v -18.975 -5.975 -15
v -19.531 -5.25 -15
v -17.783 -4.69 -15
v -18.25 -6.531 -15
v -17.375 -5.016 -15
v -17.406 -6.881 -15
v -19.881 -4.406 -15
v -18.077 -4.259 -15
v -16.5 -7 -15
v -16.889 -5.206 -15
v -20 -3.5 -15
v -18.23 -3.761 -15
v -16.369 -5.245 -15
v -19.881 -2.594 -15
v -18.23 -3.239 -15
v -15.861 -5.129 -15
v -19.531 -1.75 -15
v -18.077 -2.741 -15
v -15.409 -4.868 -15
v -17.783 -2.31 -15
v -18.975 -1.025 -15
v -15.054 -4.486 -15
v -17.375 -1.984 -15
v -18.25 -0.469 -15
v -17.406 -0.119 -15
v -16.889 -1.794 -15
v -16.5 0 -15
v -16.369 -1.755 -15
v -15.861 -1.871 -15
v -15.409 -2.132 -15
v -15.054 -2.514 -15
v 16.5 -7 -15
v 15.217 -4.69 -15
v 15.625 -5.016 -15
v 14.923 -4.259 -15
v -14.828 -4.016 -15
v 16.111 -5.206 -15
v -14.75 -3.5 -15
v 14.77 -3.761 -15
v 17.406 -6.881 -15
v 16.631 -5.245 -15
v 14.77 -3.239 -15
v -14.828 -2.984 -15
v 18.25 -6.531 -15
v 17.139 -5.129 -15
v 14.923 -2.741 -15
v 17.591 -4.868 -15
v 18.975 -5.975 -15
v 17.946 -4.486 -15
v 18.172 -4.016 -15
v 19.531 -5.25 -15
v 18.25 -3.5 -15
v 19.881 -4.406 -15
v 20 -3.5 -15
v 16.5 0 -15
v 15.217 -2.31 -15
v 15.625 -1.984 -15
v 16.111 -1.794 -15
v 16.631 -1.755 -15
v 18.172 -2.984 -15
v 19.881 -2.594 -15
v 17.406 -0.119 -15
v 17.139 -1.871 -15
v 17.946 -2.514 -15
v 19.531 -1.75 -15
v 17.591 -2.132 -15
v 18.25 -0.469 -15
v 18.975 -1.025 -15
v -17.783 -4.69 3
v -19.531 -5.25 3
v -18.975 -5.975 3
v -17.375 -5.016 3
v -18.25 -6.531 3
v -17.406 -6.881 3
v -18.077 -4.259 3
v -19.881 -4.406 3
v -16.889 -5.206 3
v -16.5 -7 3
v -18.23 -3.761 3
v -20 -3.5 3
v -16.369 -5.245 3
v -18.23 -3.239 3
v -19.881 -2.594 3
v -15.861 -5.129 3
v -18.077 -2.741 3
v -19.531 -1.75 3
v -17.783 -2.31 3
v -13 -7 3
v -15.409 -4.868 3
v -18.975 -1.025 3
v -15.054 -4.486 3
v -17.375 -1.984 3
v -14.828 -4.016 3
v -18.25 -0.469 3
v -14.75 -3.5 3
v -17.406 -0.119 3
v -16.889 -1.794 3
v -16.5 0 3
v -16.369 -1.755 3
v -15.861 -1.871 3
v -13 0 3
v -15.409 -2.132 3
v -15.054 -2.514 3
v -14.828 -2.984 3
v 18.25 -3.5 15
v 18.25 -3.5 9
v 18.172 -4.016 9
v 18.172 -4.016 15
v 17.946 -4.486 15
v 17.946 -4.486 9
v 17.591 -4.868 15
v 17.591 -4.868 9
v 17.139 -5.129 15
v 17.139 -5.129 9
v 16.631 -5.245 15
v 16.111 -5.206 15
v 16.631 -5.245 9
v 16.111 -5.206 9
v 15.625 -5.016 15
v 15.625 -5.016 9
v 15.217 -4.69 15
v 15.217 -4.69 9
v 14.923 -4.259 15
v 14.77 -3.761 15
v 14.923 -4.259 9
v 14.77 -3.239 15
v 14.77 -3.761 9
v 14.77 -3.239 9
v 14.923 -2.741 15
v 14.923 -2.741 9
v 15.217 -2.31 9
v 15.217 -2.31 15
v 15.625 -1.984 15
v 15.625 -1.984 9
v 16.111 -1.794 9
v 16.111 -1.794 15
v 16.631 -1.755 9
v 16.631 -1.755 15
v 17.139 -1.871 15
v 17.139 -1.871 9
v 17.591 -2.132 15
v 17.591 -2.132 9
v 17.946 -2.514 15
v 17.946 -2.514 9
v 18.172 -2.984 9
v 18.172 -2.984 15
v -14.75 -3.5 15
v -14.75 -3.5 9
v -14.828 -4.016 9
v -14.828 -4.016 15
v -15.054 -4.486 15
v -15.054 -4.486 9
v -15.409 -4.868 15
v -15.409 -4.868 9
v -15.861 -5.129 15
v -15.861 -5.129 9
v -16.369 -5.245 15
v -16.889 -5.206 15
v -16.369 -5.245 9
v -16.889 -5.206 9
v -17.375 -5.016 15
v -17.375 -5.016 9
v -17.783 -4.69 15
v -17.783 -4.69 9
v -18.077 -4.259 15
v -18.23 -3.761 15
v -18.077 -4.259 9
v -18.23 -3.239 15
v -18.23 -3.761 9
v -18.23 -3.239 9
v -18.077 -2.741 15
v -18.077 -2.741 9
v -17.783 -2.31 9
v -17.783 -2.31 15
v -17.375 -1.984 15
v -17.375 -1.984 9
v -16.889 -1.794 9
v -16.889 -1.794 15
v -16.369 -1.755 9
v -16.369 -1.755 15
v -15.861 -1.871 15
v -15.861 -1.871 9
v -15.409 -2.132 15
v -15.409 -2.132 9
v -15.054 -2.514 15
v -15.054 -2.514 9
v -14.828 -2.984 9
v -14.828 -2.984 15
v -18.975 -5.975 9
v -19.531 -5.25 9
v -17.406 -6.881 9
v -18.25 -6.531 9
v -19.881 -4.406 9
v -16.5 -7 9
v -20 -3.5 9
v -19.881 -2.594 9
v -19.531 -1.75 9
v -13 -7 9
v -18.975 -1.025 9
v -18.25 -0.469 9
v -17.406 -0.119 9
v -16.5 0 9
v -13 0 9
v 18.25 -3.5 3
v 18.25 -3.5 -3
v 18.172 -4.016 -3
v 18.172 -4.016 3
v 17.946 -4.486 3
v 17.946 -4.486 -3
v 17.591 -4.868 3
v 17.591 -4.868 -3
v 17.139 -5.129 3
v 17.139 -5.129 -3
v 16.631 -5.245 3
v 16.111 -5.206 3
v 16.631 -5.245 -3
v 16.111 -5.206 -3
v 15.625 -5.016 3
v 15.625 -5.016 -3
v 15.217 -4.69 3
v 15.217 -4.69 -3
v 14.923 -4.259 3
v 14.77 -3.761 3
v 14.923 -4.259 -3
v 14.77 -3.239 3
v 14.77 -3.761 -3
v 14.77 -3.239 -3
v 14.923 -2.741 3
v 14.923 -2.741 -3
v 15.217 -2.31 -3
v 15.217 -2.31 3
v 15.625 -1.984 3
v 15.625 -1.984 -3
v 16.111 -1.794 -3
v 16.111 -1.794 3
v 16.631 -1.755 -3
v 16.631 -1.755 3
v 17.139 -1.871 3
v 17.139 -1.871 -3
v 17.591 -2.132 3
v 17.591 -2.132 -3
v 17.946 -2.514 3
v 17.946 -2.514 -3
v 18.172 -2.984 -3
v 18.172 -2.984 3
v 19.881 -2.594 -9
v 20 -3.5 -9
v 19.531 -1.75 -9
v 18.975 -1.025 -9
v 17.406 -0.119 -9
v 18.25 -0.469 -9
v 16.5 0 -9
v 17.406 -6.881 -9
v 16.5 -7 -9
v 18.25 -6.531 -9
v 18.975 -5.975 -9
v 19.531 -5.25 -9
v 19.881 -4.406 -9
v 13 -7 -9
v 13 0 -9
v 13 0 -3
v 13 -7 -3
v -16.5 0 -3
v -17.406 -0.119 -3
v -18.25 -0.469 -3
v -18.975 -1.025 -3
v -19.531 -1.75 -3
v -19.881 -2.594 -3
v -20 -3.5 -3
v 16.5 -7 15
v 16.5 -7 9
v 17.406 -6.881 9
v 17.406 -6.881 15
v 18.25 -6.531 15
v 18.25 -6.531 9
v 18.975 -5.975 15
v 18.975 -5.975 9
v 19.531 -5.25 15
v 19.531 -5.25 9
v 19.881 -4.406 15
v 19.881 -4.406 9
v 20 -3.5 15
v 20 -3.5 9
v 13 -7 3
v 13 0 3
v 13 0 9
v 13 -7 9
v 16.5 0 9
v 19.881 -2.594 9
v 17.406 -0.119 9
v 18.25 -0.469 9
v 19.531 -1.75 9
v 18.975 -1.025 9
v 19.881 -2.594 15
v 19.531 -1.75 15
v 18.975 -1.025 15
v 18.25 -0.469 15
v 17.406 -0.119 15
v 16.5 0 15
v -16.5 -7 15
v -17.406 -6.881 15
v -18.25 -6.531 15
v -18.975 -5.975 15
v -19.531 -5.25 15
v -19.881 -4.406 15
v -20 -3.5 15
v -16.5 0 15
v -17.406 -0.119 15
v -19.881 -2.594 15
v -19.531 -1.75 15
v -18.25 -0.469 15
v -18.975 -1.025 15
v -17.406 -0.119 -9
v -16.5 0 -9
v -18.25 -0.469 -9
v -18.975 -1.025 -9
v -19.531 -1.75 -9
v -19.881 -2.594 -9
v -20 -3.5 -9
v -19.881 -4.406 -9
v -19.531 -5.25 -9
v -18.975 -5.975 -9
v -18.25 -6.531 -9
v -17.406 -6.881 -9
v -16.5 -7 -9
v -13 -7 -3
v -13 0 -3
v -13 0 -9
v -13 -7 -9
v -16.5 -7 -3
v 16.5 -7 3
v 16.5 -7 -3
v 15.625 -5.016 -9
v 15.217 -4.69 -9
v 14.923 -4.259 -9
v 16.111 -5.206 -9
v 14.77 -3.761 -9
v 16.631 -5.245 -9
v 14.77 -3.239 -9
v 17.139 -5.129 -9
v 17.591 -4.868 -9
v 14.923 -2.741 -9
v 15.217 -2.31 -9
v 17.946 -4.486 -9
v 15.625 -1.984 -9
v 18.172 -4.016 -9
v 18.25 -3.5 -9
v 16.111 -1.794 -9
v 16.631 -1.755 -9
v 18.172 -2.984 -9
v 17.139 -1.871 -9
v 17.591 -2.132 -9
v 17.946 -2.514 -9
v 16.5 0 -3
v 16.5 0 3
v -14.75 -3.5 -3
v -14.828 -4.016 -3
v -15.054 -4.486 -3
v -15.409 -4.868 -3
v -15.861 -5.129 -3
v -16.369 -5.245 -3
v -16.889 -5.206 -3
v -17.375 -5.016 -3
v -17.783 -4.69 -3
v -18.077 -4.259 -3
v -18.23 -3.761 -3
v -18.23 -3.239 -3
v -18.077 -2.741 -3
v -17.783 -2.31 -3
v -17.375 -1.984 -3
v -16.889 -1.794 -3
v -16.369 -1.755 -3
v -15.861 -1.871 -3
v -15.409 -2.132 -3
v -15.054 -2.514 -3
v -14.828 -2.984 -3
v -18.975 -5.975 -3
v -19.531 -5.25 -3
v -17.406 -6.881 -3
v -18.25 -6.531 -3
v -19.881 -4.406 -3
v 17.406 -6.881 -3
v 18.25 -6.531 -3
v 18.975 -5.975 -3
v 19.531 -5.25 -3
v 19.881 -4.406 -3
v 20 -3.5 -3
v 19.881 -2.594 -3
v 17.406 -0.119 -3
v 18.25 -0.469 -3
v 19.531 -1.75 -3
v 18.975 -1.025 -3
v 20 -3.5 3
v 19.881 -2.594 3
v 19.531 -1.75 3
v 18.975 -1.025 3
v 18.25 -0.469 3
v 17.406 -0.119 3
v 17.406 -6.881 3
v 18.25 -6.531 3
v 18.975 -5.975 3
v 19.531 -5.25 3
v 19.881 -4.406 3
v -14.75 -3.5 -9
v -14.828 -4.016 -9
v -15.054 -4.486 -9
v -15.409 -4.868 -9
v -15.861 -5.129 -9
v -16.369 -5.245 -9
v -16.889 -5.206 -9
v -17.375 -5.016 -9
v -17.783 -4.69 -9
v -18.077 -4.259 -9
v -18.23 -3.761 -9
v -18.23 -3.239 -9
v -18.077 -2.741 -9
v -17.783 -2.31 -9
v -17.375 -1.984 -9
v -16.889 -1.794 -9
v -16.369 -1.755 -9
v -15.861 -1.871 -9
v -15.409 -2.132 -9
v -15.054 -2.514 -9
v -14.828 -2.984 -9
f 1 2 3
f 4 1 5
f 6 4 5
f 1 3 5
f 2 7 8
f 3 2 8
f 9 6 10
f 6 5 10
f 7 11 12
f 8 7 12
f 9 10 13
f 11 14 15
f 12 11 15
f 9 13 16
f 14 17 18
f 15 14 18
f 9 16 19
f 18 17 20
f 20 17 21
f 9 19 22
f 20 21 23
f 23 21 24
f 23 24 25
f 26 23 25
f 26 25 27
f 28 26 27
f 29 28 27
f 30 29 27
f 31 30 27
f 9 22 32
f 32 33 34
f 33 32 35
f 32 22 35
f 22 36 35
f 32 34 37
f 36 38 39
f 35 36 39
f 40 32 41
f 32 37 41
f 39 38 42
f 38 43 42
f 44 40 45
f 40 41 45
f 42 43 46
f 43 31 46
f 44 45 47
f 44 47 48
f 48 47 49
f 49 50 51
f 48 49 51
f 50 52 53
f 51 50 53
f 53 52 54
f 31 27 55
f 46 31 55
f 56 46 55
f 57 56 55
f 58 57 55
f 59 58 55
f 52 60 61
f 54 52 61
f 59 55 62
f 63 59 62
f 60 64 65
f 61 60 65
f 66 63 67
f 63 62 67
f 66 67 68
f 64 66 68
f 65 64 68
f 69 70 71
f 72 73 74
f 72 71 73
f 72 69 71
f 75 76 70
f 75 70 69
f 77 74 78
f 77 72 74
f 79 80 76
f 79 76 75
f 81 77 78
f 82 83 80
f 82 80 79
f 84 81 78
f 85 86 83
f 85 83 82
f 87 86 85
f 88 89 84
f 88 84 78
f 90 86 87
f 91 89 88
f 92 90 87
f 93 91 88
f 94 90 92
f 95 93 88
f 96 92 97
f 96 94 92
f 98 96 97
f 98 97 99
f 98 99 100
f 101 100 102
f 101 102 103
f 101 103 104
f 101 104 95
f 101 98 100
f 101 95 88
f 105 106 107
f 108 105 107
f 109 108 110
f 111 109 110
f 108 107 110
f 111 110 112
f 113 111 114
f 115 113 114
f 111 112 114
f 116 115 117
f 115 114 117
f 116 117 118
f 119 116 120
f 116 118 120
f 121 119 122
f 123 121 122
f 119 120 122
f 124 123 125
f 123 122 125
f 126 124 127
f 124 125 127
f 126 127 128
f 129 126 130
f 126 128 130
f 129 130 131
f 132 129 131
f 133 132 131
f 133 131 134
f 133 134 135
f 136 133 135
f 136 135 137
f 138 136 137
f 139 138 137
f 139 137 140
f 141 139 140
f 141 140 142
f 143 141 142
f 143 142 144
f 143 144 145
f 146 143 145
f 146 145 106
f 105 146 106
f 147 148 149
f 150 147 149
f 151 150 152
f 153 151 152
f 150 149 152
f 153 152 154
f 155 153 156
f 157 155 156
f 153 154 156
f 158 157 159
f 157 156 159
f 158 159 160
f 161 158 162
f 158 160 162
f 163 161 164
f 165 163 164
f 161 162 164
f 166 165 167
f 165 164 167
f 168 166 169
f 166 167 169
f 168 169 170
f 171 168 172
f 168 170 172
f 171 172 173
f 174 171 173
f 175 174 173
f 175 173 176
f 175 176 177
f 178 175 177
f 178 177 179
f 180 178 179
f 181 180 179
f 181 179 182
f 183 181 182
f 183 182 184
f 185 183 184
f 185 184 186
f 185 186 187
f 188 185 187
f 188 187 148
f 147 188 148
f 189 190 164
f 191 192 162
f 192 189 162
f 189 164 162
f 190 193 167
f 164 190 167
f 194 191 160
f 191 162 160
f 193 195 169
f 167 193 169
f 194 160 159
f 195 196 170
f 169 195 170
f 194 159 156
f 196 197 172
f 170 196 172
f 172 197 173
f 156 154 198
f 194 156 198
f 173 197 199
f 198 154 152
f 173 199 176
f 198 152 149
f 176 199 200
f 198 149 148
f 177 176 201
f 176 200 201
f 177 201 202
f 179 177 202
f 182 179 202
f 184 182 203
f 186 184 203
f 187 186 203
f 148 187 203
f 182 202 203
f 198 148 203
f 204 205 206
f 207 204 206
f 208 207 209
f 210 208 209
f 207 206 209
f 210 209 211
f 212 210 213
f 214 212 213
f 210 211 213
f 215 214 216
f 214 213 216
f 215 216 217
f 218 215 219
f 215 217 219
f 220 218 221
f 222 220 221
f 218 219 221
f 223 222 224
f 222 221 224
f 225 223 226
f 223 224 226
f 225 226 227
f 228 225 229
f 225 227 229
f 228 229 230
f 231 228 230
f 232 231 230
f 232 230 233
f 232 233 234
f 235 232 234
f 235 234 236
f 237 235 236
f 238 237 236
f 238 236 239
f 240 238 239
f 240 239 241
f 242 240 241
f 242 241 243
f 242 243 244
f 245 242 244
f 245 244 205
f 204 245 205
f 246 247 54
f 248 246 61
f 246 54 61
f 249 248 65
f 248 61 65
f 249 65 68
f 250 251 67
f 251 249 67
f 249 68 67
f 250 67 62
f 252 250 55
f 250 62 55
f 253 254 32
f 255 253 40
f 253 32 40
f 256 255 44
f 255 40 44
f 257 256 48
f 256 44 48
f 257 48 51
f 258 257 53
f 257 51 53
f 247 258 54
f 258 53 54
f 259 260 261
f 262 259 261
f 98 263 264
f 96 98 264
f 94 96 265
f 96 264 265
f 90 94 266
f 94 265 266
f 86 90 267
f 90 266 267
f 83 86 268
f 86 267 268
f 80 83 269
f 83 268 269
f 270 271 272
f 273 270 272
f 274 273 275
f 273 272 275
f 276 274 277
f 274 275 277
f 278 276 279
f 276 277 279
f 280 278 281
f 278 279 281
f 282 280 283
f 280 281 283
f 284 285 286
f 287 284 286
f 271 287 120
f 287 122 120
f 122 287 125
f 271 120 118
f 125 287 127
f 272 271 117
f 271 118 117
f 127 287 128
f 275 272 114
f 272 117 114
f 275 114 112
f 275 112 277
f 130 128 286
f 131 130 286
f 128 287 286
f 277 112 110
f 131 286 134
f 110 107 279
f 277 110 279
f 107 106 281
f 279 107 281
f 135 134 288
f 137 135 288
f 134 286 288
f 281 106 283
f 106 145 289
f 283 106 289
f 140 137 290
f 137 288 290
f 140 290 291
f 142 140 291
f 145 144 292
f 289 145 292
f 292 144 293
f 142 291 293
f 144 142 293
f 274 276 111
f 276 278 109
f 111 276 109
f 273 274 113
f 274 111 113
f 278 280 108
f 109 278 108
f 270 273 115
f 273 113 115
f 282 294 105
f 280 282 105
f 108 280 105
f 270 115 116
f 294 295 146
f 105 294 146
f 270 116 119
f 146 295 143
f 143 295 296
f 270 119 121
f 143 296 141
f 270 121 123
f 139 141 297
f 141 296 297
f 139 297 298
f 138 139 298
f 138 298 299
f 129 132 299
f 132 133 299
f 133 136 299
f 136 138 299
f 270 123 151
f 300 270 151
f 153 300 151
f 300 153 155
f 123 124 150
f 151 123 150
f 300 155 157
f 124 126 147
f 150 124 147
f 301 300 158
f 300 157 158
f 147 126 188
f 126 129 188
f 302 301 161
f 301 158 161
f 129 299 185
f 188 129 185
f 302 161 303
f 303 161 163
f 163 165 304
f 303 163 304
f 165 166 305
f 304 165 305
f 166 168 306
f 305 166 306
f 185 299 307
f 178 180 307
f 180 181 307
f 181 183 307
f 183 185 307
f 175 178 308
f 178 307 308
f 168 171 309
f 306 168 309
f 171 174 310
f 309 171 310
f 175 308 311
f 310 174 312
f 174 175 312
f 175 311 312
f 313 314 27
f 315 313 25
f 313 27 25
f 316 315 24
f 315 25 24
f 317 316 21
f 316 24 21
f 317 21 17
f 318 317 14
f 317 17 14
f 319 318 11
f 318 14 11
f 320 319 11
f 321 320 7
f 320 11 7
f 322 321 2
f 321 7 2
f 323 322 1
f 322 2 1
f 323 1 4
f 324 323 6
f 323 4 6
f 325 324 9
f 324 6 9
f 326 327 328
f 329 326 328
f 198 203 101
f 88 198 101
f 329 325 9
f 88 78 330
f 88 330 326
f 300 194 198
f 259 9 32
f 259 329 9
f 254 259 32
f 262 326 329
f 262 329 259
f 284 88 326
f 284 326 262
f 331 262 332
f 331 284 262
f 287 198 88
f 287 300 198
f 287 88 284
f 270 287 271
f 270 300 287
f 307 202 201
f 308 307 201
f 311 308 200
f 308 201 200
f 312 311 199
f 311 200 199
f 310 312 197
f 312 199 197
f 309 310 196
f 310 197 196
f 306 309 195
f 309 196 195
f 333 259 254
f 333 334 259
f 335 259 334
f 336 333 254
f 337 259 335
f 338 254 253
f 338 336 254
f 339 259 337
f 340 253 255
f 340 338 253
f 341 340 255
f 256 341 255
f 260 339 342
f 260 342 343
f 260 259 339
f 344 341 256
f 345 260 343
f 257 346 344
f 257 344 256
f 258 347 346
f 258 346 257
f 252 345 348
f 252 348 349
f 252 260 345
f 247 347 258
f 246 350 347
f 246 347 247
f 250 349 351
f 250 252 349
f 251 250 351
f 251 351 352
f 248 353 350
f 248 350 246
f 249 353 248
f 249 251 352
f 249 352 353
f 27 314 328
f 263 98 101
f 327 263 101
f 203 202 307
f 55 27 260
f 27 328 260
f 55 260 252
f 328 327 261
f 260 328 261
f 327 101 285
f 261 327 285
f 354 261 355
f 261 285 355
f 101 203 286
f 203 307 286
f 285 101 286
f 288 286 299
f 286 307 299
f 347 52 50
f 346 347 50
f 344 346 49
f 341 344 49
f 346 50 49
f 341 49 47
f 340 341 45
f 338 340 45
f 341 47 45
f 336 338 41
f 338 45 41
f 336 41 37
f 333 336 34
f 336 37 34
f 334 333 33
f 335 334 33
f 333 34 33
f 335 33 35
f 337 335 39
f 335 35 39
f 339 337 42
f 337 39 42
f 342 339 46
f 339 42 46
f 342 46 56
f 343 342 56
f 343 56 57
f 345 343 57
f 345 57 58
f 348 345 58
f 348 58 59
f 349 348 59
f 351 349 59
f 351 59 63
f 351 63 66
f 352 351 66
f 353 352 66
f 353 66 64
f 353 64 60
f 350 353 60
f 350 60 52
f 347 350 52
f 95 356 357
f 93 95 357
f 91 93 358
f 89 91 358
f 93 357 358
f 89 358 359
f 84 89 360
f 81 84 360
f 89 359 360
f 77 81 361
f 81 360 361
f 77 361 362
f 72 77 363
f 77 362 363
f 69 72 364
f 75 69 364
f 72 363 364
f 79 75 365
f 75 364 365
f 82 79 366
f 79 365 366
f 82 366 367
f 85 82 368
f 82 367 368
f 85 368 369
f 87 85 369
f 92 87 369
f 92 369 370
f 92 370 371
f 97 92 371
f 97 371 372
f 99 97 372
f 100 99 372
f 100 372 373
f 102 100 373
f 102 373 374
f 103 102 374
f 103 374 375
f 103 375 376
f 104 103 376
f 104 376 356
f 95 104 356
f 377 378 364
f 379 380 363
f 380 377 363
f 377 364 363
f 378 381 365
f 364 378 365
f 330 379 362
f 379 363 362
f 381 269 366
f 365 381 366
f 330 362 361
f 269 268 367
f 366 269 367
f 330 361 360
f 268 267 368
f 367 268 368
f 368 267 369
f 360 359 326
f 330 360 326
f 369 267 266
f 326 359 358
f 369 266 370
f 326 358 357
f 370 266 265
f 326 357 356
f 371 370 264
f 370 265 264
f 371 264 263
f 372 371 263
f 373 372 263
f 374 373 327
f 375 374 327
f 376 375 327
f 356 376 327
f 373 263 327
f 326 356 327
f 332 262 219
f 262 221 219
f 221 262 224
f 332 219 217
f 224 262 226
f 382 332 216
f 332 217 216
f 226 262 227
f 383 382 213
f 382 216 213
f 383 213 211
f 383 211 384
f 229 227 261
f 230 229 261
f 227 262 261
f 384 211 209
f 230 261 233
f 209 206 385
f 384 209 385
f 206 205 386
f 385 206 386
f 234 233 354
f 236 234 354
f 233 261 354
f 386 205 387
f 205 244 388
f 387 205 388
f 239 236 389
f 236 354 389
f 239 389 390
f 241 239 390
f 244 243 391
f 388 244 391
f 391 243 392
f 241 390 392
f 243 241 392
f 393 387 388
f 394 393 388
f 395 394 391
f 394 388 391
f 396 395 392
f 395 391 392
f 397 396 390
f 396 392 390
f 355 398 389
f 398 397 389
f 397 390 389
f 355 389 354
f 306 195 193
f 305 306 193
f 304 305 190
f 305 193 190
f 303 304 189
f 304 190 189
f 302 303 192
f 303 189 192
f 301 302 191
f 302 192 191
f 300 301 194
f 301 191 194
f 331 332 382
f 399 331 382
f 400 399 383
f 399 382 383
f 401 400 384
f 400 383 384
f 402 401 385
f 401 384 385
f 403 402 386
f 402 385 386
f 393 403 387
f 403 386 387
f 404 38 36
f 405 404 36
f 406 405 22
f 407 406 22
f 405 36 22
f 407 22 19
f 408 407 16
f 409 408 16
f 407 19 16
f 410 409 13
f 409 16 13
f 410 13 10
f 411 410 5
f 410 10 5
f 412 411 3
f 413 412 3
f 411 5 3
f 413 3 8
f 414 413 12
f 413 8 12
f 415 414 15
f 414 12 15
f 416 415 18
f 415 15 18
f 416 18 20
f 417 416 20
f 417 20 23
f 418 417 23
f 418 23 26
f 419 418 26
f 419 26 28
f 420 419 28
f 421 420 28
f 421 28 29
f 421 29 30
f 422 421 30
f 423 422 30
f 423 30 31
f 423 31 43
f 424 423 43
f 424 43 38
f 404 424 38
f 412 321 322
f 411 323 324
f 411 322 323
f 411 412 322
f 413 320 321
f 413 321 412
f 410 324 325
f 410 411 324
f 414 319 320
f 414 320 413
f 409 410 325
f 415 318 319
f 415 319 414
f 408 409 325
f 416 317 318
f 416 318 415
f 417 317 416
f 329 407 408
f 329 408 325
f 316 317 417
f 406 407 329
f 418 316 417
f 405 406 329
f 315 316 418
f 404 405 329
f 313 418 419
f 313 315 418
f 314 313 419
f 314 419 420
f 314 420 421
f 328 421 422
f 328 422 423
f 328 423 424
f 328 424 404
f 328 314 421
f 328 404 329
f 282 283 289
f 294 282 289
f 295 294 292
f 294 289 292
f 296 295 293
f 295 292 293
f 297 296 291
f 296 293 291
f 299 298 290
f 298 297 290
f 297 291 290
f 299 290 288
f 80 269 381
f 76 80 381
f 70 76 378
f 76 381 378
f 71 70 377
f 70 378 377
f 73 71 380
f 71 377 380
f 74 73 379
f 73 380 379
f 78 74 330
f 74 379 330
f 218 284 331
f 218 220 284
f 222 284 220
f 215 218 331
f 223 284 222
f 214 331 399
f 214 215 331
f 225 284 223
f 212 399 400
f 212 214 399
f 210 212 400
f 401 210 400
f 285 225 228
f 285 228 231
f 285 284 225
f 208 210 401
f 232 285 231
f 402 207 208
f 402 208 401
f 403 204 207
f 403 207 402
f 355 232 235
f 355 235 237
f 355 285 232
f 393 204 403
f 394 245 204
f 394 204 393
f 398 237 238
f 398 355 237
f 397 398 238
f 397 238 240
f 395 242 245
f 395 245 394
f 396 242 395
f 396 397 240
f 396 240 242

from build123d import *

# Parameters (mm, degrees)
F0_W     = 7
F0_H     = 6
F1_DEPTH = 7
F2_R     = 1.75
F3_DEPTH = 30.001


# Not quite as in the source:
# - a feature names something its author has since deleted; it is built from what else it names


with BuildPart() as f1:
    # F0 (on Front) → F1 (new body)
    with BuildSketch(Plane.XZ):
        with Locations((16.5, 12)):
            Rectangle(F0_W, F0_H)
        with Locations((16.5, -12)):
            Rectangle(F0_W, F0_H)
        with Locations((16.5, 0)):
            Rectangle(F0_W, F0_H)
        with Locations((-16.5, 12)):
            Rectangle(F0_W, F0_H)
        with Locations((-16.5, 0)):
            Rectangle(F0_W, F0_H)
        with Locations((-16.5, -12)):
            Rectangle(F0_W, F0_H)
        Polygon((13, 9), (13, 15), (-13, 15), (-13, 9), (-13, 3), (-13, -3), (-13, -9), (-13, -15), (13, -15), (13, -9), (13, -3), (13, 3), align=None)
    extrude(amount=F1_DEPTH)

    # F2 (on face) → F3 (cut, through all)
    with BuildSketch(Plane(origin=(0, 0, -15), x_dir=(1, 0, 0), z_dir=(0, 0, -1))):
        with Locations((-16.5, 3.5)):
            Circle(F2_R)
        with BuildLine():
            Line((-20, 0), (-16.5, 0))
            ThreePointArc((-16.5, 0), (-18.9748737342, 1.0251262658), (-20, 3.5))
            Line((-20, 3.5), (-20, 0))
        make_face()
        with BuildLine():
            ThreePointArc((-20, 3.5), (-18.9748737342, 5.9748737342), (-16.5, 7))
            Line((-16.5, 7), (-20, 7))
            Line((-20, 7), (-20, 3.5))
        make_face()
        with BuildLine():
            Line((20, 7), (16.5, 7))
            ThreePointArc((16.5, 7), (18.9748737342, 5.9748737342), (20, 3.5))
            Line((20, 3.5), (20, 7))
        make_face()
        with BuildLine():
            ThreePointArc((20, 3.5), (18.9748737342, 1.0251262658), (16.5, 0))
            Line((16.5, 0), (20, 0))
            Line((20, 0), (20, 3.5))
        make_face()
        with Locations((16.5, 3.5)):
            Circle(F2_R)
    extrude(amount=-F3_DEPTH, mode=Mode.SUBTRACT)


solid = f1.part
